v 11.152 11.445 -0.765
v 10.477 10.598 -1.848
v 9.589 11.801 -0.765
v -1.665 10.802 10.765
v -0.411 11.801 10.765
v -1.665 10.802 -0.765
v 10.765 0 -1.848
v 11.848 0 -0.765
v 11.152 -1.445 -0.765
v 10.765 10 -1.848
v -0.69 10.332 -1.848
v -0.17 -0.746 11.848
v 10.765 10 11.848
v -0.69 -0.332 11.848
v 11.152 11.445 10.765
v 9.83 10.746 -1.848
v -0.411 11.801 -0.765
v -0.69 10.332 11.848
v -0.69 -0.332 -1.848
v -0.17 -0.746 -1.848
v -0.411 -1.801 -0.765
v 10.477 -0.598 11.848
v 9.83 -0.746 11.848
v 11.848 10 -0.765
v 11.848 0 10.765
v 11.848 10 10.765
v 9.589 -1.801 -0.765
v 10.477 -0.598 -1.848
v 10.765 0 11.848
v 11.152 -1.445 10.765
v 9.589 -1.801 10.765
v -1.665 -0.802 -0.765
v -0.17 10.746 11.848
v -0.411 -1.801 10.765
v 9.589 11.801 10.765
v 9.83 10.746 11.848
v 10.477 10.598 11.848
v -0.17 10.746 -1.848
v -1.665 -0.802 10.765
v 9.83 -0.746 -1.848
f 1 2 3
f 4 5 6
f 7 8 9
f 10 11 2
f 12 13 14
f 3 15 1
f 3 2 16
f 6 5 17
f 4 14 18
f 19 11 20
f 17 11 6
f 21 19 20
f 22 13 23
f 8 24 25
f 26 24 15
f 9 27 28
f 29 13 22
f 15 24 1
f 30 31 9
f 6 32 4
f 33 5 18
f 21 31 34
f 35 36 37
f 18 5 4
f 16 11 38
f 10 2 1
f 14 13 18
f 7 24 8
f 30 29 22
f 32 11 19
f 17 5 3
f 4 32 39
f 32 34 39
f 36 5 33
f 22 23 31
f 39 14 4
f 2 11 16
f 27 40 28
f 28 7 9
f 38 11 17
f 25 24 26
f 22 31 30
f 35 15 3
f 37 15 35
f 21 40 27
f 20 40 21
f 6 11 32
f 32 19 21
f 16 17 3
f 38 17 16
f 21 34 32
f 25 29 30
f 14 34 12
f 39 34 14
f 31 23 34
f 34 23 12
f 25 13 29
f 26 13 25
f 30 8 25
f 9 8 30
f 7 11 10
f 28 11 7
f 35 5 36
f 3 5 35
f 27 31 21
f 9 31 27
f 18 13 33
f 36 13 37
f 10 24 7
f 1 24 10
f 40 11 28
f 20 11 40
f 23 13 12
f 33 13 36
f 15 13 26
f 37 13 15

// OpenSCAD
// model27: minkowski operation
minkowski() {
    cube(10);
    sphere(r = 2);
}
